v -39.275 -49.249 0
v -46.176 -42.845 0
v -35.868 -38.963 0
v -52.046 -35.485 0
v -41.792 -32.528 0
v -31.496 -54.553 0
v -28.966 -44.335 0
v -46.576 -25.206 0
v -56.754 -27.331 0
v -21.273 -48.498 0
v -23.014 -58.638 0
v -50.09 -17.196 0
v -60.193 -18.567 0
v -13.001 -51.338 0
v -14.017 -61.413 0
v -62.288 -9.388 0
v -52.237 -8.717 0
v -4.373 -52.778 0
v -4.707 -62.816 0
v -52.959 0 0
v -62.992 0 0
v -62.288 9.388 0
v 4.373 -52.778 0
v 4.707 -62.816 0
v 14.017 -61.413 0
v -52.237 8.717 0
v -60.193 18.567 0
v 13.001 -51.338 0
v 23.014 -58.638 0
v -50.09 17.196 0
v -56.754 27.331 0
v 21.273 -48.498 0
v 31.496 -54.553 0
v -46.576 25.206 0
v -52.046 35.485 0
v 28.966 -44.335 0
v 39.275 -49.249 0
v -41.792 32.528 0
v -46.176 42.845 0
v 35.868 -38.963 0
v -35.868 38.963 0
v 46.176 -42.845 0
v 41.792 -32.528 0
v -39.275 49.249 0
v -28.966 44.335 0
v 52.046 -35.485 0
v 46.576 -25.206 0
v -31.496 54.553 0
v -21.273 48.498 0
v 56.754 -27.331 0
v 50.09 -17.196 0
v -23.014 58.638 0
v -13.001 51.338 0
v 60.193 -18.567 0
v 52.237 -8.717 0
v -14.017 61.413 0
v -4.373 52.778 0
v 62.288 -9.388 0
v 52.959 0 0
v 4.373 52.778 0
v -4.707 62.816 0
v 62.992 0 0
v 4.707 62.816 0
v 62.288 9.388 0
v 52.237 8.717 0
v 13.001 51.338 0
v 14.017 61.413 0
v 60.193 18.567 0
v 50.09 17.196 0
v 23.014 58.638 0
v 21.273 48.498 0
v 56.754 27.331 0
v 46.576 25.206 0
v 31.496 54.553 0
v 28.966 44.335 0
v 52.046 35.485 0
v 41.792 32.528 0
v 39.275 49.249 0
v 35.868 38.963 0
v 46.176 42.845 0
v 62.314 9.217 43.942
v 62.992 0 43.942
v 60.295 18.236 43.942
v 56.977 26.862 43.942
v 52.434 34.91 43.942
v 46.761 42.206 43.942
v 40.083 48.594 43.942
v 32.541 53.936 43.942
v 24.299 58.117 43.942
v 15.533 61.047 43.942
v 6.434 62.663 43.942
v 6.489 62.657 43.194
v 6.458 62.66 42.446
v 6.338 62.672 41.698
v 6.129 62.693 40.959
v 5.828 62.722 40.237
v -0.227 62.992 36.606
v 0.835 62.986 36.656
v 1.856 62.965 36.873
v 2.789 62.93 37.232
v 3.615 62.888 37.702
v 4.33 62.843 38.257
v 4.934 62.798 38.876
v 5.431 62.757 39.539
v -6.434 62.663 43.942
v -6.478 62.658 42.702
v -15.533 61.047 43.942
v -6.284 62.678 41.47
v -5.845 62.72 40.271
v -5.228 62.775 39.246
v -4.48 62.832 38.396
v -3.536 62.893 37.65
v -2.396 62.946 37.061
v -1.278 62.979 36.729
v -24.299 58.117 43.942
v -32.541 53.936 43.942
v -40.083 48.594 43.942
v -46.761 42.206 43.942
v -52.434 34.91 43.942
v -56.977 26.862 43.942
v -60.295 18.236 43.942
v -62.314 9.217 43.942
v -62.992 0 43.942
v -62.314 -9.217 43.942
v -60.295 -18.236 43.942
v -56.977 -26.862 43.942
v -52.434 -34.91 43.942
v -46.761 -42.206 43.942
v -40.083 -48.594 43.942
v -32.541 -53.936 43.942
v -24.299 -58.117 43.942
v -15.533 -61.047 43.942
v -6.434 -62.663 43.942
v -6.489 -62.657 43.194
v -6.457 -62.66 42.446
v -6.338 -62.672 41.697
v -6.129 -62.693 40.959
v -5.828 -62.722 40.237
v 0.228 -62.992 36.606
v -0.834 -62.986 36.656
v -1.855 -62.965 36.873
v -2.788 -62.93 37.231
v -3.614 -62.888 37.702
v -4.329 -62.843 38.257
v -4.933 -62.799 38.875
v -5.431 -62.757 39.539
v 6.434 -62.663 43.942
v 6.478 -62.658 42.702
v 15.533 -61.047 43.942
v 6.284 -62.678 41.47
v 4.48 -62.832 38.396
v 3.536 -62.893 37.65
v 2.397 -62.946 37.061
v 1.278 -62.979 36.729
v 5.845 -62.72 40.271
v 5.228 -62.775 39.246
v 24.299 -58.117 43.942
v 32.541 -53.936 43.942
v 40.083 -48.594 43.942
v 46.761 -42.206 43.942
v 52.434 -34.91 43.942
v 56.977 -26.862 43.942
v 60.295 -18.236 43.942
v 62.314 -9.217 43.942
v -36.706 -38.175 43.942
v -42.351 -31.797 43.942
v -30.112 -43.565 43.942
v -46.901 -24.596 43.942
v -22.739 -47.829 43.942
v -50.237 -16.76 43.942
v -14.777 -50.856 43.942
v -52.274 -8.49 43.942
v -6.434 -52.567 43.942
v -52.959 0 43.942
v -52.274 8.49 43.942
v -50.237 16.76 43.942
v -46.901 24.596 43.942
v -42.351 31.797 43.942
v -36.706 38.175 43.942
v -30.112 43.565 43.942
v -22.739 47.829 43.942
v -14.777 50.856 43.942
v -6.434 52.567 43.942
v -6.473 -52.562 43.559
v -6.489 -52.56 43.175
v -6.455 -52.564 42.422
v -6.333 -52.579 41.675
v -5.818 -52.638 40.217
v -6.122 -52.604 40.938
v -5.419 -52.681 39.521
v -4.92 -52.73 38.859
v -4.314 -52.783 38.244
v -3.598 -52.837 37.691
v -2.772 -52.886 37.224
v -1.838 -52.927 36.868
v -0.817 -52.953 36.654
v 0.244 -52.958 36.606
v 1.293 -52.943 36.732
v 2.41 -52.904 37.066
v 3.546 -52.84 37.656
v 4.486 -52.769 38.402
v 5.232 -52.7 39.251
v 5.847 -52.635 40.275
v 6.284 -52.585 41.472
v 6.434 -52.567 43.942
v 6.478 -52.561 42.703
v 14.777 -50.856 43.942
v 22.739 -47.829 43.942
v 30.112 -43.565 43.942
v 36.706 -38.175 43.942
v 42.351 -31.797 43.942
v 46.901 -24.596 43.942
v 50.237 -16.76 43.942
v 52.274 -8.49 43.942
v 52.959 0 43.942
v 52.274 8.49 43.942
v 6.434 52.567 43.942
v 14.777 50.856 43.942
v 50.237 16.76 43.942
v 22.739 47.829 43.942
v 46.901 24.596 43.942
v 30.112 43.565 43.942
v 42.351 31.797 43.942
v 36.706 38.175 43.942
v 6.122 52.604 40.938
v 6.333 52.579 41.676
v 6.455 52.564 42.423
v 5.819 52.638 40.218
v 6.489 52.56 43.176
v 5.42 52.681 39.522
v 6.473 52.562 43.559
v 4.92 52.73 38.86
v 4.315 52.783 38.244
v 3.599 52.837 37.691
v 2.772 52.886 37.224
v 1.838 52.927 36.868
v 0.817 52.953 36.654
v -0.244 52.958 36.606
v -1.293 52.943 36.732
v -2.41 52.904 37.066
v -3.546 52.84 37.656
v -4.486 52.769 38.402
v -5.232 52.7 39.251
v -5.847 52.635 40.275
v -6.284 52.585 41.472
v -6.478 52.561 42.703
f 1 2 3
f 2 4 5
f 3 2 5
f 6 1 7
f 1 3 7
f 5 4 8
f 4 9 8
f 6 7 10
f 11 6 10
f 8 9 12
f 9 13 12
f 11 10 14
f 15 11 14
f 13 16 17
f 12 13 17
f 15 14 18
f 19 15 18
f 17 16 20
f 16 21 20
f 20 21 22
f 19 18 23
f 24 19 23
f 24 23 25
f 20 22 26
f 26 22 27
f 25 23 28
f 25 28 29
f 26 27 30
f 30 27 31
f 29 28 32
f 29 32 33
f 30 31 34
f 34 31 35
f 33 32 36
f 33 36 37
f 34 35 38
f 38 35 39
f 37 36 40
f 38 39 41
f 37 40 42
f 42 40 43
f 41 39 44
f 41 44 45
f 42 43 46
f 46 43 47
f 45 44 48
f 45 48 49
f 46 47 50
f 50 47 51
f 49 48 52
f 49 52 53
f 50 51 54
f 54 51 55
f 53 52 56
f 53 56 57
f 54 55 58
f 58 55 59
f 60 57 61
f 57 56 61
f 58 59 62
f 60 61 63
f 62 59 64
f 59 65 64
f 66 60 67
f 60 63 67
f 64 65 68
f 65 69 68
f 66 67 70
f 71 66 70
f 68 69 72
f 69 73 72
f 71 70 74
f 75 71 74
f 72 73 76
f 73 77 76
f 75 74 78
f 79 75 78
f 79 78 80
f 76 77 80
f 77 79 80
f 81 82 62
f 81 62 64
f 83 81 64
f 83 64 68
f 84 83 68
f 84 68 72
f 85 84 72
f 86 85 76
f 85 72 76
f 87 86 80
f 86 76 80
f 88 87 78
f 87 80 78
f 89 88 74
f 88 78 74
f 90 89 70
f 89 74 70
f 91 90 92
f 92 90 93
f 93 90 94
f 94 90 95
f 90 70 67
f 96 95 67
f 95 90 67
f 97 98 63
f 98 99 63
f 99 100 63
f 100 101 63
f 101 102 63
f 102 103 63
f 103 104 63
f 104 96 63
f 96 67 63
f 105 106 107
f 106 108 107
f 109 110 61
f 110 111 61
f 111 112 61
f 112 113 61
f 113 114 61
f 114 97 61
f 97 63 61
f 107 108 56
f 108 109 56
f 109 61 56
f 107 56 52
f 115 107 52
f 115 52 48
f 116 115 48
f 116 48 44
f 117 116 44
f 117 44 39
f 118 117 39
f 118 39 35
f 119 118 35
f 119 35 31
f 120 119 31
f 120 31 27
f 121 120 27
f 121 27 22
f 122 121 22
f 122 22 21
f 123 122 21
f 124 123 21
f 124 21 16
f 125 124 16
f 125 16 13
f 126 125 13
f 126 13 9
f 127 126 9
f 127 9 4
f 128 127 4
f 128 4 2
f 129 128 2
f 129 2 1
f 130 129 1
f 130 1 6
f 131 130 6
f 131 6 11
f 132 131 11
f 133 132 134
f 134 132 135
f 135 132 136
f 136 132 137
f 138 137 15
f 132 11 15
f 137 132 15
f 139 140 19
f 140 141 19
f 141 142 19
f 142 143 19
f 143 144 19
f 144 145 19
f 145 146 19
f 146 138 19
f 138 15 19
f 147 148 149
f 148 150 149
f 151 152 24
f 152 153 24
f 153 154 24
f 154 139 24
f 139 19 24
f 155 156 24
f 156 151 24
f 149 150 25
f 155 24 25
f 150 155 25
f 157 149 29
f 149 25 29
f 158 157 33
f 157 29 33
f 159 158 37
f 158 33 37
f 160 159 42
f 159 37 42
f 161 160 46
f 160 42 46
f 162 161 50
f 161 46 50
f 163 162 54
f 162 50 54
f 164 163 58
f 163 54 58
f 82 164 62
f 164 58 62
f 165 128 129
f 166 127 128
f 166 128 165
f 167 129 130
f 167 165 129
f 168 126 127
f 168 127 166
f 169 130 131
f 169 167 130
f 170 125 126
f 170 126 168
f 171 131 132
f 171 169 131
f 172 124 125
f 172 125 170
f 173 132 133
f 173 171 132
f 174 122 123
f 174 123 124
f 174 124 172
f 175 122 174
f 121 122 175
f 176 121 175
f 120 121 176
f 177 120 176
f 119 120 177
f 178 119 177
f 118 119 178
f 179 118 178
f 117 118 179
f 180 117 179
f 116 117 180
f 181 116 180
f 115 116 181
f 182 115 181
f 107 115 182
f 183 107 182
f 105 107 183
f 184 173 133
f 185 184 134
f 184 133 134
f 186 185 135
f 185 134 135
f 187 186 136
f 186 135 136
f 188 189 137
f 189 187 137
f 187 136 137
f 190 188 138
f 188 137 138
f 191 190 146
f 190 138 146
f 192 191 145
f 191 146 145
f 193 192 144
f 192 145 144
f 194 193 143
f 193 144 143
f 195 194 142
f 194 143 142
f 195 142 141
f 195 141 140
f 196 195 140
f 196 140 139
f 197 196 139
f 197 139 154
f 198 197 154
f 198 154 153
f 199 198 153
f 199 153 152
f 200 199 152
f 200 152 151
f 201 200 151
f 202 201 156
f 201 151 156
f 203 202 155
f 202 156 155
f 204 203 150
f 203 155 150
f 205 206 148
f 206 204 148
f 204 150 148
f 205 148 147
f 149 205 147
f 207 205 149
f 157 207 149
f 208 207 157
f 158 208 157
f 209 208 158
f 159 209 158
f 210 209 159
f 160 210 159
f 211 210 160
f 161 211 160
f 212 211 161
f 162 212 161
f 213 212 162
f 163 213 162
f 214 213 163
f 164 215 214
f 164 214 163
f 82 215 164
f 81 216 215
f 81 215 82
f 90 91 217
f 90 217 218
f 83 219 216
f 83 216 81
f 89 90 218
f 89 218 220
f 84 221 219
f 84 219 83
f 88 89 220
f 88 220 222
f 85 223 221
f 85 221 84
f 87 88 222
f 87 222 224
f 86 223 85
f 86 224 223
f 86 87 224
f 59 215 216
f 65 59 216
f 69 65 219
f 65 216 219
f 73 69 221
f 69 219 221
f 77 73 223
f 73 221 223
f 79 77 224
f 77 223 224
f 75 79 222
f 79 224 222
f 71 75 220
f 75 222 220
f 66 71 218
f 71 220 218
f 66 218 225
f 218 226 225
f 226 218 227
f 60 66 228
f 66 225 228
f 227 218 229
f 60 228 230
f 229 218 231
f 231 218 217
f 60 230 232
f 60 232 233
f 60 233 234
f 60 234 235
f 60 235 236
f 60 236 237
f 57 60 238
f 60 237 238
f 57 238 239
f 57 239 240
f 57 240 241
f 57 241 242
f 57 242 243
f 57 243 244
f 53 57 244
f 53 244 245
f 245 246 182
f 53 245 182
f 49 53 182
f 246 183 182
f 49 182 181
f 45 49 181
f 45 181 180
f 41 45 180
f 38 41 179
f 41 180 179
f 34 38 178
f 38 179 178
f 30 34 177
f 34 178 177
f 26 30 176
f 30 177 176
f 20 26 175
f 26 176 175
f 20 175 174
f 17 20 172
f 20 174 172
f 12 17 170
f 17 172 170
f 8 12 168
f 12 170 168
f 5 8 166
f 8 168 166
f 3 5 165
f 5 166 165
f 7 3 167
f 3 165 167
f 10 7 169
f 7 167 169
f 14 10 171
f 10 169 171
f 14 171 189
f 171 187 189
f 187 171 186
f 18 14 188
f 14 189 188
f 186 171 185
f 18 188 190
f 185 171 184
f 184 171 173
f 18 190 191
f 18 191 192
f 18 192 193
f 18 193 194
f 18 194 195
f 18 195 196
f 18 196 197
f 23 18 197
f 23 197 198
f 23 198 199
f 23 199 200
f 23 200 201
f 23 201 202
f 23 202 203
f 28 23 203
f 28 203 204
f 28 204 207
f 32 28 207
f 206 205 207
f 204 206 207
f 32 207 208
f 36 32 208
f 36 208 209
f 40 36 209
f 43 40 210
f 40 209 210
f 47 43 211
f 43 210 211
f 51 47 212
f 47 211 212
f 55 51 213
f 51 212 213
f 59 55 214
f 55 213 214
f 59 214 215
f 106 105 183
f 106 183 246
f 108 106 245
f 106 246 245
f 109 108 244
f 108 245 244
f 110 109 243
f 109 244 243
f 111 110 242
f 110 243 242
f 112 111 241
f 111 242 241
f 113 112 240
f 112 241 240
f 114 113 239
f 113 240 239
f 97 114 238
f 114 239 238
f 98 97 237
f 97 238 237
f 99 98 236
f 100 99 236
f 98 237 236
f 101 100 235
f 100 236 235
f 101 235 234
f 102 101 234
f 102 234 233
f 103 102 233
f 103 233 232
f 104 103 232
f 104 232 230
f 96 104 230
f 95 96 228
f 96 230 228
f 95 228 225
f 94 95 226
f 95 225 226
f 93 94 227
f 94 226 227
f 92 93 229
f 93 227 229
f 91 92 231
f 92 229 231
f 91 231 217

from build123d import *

# Parameters (mm, degrees)
F0_R     = 62.992
F1_DEPTH = 43.942
F2_R     = 52.959
F3_DEPTH = 43.942
F4_R     = 6.4897
F5_DEPTH = 63.5


with BuildPart() as f1:
    # F0 (on Top) → F1 (new body)
    with BuildSketch(Plane.XY):
        Circle(F0_R)
    extrude(amount=F1_DEPTH)

    # F2 (on face) → F3 (cut)
    with BuildSketch(Plane.XY.offset(43.942)):
        Circle(F2_R)
    extrude(amount=-F3_DEPTH, mode=Mode.SUBTRACT)

    # F4 (on Front) → F5 (cut, symmetric)
    with BuildSketch(Plane.XZ):
        with Locations((0, 43.091593)):
            Circle(F4_R)
    extrude(amount=F5_DEPTH, both=True, mode=Mode.SUBTRACT)


solid = f1.part
